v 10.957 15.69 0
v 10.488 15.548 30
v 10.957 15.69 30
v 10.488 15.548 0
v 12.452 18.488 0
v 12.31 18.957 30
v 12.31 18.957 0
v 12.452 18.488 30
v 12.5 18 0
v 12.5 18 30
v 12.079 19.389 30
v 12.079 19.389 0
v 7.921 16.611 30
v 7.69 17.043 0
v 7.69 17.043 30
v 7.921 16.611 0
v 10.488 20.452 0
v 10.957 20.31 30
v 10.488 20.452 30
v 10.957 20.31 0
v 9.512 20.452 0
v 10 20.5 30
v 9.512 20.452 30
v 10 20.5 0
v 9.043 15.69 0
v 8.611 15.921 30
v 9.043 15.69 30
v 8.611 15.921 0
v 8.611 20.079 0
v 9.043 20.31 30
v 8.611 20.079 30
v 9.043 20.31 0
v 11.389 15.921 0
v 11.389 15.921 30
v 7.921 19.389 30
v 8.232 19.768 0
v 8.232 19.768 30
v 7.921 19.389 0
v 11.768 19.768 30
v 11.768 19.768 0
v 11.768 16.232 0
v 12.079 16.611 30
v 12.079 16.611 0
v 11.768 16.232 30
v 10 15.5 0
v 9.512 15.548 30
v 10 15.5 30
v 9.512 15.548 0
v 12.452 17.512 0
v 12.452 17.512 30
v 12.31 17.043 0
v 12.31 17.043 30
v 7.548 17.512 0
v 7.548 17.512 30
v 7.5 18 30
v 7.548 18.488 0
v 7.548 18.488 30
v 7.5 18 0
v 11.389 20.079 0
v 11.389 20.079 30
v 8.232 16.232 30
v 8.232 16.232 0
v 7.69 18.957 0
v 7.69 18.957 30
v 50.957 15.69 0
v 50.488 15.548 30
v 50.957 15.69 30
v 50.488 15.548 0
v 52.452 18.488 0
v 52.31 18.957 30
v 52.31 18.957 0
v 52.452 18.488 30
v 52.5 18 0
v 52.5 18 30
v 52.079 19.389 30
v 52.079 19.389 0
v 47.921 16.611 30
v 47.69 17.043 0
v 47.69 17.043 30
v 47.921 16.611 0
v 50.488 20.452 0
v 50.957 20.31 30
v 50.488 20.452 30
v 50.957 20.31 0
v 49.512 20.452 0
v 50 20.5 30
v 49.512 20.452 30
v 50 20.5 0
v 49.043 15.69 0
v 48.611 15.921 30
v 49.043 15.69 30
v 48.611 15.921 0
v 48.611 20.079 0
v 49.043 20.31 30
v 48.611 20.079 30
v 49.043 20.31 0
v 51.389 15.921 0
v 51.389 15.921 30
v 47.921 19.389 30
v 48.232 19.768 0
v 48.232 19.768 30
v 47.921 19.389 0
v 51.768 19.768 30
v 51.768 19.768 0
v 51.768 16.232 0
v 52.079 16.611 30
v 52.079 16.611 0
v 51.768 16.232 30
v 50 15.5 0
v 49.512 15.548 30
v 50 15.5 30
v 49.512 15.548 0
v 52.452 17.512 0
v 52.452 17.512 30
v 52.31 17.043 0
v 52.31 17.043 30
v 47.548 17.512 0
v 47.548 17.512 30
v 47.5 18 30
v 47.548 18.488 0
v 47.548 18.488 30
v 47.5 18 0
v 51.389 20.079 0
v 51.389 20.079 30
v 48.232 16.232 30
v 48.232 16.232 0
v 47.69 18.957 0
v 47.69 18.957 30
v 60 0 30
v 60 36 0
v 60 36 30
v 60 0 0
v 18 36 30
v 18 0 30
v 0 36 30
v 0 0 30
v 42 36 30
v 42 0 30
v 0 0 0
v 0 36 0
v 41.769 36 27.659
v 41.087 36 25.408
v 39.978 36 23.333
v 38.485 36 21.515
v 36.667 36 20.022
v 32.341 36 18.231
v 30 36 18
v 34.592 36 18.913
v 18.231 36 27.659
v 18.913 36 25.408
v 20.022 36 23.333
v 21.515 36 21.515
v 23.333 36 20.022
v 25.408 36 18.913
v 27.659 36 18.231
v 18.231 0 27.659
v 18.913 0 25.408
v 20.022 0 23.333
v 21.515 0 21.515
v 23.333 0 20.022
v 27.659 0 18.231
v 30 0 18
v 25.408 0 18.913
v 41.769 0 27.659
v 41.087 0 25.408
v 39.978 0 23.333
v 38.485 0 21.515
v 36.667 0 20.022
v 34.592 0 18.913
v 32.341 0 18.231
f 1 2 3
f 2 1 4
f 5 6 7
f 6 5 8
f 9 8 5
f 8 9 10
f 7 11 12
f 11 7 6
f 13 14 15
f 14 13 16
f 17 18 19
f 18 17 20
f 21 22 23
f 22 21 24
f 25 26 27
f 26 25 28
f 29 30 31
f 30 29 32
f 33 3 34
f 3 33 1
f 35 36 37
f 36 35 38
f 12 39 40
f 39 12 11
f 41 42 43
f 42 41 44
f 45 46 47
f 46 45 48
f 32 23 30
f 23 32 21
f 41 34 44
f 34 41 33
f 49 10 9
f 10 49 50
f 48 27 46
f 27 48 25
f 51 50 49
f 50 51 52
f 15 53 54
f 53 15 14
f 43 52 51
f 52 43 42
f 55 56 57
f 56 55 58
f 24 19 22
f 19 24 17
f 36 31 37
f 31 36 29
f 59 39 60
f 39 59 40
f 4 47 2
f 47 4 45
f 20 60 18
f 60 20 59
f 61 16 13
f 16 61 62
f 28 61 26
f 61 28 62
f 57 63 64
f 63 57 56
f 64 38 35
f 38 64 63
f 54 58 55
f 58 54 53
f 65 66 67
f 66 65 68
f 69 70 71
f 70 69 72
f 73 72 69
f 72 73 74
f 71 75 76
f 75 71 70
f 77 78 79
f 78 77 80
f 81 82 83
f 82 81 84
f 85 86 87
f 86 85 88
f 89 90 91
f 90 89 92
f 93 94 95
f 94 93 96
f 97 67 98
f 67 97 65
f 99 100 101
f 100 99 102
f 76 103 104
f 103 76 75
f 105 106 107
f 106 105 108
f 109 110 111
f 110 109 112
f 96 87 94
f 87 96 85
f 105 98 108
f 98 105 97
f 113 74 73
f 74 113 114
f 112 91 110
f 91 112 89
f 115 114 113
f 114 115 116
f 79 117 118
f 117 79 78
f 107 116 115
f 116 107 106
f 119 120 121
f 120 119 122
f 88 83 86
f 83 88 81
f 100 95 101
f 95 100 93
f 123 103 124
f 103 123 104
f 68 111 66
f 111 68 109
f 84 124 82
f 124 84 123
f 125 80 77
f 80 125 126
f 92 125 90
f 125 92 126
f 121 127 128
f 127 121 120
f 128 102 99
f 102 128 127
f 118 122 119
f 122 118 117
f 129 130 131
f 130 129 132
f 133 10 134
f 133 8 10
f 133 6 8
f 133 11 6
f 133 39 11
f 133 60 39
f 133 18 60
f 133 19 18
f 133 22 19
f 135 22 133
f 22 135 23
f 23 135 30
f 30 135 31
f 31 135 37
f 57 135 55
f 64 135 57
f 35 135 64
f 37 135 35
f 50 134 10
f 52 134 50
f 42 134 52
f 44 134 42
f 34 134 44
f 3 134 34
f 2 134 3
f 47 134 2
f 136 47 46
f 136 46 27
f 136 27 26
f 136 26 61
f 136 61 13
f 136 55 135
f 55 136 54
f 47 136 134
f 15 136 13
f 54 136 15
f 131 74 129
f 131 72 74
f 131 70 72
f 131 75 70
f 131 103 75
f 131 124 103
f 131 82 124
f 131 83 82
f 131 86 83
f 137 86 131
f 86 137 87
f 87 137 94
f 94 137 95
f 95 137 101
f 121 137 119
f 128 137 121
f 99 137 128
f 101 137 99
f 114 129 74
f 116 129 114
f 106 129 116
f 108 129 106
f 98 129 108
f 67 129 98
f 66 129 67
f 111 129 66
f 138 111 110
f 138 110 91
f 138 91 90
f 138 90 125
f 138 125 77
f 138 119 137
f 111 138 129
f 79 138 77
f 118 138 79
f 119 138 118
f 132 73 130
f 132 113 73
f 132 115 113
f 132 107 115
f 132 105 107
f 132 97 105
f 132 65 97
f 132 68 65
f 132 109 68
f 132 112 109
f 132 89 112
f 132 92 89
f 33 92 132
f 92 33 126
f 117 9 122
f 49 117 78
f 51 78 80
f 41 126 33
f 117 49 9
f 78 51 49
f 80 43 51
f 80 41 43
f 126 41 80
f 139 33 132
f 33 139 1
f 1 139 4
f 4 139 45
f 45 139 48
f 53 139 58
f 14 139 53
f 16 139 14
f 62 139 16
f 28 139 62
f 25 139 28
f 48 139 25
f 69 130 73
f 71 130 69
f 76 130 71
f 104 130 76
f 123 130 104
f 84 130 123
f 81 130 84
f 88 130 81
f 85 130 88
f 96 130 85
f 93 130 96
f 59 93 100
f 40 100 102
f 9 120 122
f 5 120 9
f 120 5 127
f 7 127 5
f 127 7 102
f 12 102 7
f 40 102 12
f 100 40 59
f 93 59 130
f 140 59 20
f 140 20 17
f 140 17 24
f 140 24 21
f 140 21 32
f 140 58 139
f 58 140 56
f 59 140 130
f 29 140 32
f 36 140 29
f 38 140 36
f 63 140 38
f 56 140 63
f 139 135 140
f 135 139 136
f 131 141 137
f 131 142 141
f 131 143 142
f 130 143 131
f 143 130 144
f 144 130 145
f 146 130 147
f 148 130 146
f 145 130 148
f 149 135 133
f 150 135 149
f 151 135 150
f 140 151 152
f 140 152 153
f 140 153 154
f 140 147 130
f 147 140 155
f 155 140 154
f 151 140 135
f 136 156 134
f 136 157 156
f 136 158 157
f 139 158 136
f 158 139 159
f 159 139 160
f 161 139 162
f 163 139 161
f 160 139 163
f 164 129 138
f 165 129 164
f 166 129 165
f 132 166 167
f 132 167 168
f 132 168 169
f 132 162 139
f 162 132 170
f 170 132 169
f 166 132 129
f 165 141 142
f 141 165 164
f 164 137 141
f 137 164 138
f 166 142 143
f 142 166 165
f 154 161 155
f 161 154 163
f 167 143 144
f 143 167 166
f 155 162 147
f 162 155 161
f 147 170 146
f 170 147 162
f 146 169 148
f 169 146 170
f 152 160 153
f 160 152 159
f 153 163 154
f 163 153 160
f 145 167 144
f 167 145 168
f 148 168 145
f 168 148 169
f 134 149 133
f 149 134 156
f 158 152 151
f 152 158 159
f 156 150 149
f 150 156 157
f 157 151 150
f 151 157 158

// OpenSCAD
$fn = 32;

// ----------------------------------------------------------------------
// Saddle clamp: plain shaft clamp
// ----------------------------------------------------------------------

// --- parameters (mm) ---
blk_l = 60;               // block length, X
blk_w = 36;               // block width, Y
blk_h = 30;               // block height
clamp_r = 12;             // shaft groove radius
hole_r = 2.5;             // bolt hole radius
hole_m = 10;              // bolt hole margin from the ends

saw_depth = clamp_r + 3;  // saw kerf depth

difference() {
  cube([blk_l, blk_w, blk_h]);
  translate([blk_l / 2, -1, blk_h])
    rotate([-90, 0, 0])
      cylinder(h = blk_w + 2, r = clamp_r);
  for (sx = [0, 1])
    translate([sx ? blk_l - hole_m : hole_m, blk_w / 2, -1])
      cylinder(r = hole_r, h = blk_h + 2);
}
